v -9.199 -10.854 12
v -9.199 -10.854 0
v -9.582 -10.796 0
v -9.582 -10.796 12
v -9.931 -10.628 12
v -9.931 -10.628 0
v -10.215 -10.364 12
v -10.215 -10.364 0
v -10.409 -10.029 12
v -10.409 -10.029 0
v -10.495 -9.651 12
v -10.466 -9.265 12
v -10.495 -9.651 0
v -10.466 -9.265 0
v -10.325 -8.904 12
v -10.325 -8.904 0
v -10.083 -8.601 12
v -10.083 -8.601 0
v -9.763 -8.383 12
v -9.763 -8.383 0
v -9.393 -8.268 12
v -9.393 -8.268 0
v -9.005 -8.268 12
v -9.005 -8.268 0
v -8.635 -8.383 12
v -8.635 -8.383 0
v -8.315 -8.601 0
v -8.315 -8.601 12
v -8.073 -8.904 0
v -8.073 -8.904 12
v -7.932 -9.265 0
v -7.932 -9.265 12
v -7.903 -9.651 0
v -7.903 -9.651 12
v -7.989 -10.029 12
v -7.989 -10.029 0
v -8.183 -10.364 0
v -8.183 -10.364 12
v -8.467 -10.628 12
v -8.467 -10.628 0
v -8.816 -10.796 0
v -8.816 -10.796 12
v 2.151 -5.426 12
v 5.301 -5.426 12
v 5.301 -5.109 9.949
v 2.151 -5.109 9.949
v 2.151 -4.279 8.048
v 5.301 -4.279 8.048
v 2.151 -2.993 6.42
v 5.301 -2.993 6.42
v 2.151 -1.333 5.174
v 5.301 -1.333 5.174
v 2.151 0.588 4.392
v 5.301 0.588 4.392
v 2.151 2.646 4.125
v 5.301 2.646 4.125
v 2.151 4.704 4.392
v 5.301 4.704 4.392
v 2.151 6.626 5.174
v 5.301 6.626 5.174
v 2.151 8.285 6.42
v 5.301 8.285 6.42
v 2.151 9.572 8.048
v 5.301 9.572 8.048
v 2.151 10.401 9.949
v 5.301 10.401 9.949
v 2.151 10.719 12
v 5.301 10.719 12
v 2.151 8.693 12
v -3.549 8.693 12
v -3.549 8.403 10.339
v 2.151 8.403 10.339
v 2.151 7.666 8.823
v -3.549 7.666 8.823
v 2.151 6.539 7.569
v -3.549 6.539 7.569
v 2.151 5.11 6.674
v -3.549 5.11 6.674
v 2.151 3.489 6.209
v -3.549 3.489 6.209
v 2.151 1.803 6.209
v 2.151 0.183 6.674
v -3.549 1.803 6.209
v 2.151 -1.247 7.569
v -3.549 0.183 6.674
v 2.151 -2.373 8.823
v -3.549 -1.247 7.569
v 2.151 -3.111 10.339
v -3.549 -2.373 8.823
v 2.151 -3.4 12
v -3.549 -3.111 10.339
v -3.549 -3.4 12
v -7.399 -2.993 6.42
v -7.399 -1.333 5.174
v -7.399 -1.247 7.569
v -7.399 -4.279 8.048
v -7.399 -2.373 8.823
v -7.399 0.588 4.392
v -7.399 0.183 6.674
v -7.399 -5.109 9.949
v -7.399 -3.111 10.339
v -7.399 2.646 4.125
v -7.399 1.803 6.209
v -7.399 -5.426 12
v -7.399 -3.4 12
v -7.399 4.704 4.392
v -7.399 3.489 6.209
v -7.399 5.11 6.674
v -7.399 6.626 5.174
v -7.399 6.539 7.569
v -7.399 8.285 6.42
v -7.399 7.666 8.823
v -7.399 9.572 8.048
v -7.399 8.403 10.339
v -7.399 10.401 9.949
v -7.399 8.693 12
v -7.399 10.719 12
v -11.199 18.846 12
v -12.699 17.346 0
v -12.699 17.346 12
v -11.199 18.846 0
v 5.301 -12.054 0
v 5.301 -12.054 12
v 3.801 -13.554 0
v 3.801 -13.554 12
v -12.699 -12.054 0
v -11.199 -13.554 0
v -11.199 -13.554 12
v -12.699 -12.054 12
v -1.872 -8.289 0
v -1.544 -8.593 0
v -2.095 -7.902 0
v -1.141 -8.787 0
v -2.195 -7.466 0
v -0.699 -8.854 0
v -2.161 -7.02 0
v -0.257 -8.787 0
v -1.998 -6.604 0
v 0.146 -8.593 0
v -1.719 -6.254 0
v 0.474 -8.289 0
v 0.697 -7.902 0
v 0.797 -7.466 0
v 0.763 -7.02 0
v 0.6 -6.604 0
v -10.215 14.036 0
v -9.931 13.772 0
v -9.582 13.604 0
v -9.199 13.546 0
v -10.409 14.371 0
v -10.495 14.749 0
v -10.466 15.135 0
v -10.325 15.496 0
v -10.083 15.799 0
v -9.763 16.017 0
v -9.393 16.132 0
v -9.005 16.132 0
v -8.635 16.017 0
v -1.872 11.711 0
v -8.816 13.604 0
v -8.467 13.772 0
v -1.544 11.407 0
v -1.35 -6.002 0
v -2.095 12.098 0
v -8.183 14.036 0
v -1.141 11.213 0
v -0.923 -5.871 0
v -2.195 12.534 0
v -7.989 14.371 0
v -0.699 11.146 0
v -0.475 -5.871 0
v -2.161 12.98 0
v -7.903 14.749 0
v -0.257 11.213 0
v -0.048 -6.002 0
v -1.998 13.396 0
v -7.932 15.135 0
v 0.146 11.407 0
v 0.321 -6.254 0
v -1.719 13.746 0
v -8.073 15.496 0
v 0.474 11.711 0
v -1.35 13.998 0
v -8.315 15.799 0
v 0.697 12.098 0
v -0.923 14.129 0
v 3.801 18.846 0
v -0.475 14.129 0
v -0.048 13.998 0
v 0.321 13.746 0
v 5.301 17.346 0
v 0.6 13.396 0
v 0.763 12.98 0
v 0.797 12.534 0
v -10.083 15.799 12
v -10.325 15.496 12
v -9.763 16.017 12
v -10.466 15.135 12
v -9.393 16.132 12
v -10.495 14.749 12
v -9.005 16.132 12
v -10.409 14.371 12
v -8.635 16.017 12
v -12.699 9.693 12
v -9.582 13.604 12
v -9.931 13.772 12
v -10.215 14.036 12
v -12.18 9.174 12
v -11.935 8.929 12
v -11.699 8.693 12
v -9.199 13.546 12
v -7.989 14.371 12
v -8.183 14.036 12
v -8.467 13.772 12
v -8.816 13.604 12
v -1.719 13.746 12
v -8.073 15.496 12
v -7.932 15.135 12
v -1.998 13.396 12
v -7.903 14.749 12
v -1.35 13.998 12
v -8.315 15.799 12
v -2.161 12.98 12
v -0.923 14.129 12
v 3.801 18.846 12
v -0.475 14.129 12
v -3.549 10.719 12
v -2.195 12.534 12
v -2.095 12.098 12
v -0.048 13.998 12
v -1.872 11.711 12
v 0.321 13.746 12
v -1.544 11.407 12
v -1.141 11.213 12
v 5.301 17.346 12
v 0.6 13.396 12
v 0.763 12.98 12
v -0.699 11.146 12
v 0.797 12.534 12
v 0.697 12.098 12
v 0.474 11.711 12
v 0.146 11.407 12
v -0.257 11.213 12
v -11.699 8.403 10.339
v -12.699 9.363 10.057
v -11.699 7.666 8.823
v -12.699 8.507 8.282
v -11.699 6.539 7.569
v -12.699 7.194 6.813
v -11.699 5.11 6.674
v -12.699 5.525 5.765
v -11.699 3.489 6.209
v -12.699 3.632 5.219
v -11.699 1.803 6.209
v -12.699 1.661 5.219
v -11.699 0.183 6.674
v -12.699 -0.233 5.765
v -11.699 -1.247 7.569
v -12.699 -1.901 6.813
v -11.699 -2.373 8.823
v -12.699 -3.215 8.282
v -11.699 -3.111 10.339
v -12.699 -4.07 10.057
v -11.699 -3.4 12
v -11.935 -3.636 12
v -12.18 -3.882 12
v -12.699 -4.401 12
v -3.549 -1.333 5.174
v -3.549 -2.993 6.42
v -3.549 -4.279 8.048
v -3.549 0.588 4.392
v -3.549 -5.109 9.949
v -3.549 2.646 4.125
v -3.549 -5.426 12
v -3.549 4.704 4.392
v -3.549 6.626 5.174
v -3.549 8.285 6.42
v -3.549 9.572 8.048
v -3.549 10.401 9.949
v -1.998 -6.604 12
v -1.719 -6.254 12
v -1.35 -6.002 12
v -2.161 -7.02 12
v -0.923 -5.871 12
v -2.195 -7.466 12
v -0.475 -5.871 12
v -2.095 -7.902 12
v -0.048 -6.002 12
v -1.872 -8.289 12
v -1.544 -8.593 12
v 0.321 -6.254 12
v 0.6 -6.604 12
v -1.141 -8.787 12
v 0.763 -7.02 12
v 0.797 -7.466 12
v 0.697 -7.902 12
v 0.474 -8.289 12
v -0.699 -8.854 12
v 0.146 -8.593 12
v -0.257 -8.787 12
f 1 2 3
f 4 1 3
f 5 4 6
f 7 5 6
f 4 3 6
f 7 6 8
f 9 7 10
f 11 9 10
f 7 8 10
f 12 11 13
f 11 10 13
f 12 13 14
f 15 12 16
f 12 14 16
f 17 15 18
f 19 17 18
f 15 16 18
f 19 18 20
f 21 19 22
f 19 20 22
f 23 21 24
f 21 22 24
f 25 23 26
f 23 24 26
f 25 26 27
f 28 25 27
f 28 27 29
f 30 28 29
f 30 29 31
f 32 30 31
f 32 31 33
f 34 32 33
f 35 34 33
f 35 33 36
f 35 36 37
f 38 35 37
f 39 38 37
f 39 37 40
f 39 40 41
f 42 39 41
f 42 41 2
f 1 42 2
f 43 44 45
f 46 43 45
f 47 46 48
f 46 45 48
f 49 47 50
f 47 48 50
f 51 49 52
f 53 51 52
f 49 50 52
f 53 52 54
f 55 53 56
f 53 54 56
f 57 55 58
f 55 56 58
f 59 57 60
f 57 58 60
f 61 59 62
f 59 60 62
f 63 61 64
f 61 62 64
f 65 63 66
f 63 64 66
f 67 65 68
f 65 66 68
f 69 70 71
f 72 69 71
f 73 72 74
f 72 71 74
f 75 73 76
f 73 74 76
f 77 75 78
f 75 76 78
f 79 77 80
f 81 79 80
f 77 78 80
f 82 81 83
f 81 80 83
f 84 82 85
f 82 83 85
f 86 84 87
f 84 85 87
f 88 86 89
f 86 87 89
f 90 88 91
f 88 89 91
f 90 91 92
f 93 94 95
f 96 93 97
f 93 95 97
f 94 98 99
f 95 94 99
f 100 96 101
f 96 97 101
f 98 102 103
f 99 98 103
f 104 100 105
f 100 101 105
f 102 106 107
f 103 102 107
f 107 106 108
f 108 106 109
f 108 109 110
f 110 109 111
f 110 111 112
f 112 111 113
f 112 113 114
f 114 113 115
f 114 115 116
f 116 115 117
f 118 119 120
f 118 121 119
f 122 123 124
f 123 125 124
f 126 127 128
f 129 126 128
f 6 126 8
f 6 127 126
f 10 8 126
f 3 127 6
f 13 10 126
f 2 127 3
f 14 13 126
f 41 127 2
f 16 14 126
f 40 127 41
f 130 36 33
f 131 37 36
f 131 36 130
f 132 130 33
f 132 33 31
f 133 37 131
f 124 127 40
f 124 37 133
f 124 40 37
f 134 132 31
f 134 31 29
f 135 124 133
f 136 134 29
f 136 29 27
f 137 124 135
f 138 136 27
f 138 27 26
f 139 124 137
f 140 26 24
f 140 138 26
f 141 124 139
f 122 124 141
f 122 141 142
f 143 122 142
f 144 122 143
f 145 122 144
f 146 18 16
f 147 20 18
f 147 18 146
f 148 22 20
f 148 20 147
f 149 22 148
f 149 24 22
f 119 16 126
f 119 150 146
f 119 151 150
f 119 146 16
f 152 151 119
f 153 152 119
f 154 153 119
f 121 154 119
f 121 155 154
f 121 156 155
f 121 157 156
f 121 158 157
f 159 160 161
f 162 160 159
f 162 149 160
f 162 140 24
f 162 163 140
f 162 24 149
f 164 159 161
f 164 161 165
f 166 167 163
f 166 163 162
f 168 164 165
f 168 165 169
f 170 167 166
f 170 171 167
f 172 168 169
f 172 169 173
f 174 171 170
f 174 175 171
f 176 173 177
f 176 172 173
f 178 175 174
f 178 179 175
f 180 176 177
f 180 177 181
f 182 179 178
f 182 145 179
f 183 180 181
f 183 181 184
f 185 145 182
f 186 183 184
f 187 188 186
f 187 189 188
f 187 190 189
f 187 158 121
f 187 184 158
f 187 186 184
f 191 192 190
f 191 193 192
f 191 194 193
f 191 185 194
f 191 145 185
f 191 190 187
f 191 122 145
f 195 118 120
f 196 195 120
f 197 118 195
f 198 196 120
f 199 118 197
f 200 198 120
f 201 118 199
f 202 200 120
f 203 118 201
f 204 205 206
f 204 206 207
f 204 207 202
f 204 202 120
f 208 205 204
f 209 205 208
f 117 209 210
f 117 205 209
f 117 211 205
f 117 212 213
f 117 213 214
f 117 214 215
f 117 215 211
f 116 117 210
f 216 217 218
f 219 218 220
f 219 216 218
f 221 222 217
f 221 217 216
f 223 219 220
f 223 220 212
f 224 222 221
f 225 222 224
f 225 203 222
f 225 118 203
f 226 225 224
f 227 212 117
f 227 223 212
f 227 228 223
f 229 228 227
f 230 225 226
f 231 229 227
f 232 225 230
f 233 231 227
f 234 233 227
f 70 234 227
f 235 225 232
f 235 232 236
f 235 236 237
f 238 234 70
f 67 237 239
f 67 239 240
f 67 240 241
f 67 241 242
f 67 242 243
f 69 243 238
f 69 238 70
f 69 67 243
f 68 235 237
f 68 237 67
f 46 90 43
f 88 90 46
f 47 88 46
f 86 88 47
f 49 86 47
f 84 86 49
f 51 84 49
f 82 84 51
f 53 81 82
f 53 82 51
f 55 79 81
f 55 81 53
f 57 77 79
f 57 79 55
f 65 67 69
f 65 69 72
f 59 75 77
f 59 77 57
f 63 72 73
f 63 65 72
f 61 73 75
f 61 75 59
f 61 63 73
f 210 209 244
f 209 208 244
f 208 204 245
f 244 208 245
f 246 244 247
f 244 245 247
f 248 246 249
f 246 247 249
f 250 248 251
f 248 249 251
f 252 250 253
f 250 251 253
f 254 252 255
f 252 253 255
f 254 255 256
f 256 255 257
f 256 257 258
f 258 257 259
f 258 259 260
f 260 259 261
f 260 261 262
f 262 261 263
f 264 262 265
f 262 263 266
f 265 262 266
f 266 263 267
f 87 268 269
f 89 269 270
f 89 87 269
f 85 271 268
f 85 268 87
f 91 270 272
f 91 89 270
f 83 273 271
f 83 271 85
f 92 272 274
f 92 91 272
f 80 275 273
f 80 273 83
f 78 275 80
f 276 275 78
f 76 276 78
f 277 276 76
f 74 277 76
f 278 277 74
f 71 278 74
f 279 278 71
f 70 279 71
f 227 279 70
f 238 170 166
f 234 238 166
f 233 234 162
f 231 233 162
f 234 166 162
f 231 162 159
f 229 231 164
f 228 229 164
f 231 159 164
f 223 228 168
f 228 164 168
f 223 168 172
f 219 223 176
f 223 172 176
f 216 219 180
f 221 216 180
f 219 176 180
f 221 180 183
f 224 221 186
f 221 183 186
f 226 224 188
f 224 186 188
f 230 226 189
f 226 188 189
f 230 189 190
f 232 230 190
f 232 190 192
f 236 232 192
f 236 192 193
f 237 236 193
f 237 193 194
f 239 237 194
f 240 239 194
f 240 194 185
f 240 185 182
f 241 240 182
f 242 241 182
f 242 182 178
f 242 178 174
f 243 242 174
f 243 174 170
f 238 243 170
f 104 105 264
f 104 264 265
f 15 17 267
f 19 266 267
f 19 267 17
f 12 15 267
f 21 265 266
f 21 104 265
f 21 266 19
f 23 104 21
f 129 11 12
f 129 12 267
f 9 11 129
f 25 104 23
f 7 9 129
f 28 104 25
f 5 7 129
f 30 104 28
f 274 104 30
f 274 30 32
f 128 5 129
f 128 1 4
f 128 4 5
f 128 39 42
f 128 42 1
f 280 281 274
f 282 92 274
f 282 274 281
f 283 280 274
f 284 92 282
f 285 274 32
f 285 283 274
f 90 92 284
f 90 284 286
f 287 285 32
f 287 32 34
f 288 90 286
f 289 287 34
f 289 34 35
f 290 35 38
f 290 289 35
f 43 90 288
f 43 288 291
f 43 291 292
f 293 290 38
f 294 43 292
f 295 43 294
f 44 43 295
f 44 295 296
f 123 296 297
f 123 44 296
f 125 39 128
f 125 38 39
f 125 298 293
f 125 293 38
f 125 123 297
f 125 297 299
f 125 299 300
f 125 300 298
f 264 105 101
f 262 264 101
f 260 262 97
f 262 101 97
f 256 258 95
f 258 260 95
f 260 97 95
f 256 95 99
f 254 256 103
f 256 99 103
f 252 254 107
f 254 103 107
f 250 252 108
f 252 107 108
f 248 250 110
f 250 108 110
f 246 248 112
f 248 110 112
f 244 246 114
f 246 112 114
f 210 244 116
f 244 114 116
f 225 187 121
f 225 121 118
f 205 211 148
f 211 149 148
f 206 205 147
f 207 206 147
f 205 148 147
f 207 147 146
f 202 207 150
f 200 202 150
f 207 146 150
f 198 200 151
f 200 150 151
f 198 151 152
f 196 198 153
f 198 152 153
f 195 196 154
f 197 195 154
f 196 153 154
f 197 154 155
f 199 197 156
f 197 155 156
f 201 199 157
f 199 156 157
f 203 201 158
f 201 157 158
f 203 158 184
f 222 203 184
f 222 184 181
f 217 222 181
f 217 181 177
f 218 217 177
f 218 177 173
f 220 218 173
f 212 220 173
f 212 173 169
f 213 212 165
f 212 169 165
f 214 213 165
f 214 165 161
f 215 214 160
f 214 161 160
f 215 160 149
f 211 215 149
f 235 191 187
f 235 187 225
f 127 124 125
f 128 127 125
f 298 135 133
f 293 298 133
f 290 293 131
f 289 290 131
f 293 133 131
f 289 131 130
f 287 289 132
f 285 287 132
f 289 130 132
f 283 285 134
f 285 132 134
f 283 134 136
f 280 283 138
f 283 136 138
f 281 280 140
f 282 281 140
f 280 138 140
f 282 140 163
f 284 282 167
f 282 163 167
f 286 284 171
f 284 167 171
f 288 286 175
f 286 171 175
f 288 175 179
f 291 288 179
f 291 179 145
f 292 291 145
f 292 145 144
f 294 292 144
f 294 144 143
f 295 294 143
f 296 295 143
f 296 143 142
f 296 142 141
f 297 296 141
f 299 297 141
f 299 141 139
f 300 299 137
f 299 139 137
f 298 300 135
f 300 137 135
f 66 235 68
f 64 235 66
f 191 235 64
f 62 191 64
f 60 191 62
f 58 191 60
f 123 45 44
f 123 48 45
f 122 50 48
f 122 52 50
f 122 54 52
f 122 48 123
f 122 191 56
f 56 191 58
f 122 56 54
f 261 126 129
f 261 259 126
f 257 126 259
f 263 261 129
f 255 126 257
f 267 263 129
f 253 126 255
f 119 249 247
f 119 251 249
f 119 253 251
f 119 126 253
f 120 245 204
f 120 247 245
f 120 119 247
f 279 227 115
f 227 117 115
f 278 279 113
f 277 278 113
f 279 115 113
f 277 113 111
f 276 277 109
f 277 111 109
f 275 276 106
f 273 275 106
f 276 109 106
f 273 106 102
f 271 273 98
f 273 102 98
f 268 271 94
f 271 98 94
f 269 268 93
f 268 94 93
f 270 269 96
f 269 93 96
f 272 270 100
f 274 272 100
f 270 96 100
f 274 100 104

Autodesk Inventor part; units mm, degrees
ref_plane "YZ Plane" through (0, 0, 0) normal (1, 0, 0) x (0, 1, 0)
ref_plane "XZ Plane" through (0, 0, 0) normal (0, 1, 0) x (-1, 0, 0)
ref_plane "XY Plane" through (0, 0, 0) normal (0, 0, 1) x (1, 0, 0)
sketch "Szkic1" plane through (0, 0, 0) normal (0, 0, 1) x (1, 0, 0)
  line L0 (-10.699, 18.8462) -> (5.301, 18.8462)
  line L1 (5.301, 18.8462) -> (5.301, -13.5538)
  line L2 (5.301, -13.5538) -> (-10.699, -13.5538)
  line L3 (-10.699, -13.5538) -> (-10.699, 18.8462)
  point P0 (0, 0)
  dimension "d0" = 16
  dimension "d1" = 32.4
extrude "Wyciągnięcie proste1" add sketch "Szkic1" along normal blind 12
sketch "Szkic2" plane through (-10.699, -13.5538, 0) normal (-1, 0, 0) x (0, 0, 1)
  line L0 (0, 0) -> (0, 32.4) projected
  line L1 (0, 0) -> (12, 0) projected
  line L2 (12, 32.4) -> (12, 0) projected
  line L3 (0, 32.4) -> (12, 32.4) projected
  line L4 (12, 32.4) -> (12, 0) projected
  circle A0 centre (12.2, 16.2) radius 6.05
  point P0 (0, 13.5538)
  dimension "d4" = 32.4
  dimension "d6" = 12.1
  dimension "d66" = 16.2
  dimension "d67" = 0.2
extrude "Wyciągnięcie proste2" cut sketch "Szkic2" against normal blind 13 contours A0 L2 | L2 A0
sketch "Szkic3" plane through (-10.699, -13.5538, 0) normal (-1, 0, 0) x (0, 0, 1)
  arc A0 (12, 22.2467) -> (12, 10.1533) centre (12.2, 16.2) ccw projected
  line L0 (12, 32.4) -> (12, 22.2467) projected
  line L1 (0, 32.4) -> (12, 32.4) projected
  line L2 (0, 0) -> (0, 32.4) projected
  line L3 (0, 0) -> (12, 0) projected
  line L4 (12, 10.1533) -> (12, 0) projected
  arc A1 (12, 24.2725) -> (12, 8.1275) centre (12.2, 16.2) ccw
  point P0 (0, 13.5538)
  dimension "d9" = 16.15
extrude "Wyciągnięcie proste3" cut sketch "Szkic3" against normal blind 7.15 contours A0 L4 A1 L0
extrude "Wyciągnięcie proste4" add sketch "Szkic3" against normal blind 3.3 contours A0 L4 A1 L0
sketch "Szkic6" plane through (5.301, -13.5538, 0) normal (1, 0, 0) x (0, 0, -1)
  arc A0 (-12, 8.1275) -> (-12, 24.2725) centre (-12.2, 16.2) ccw projected
  line L0 (0, 32.4) -> (0, 0) projected
  line L1 (0, 32.4) -> (-12, 32.4) projected
  line L2 (-12, 0) -> (-12, 32.4) projected
  line L3 (0, 0) -> (-12, 0) projected
  arc A1 (-12, 8.1275) -> (-12, 24.2725) centre (-12.2, 16.2) ccw
  point P0 (0, 13.5538)
extrude "Wyciągnięcie proste5" cut sketch "Szkic6" against normal blind 3.15 contours L2 A0
sketch "Szkic7" plane through (0, 0, 12) normal (0, 0, 1) x (1, 0, 0)
  line L0 (5.301, -5.4264) -> (2.151, -5.4264) projected
  line L1 (2.151, -5.4264) -> (2.151, -3.4005) projected
  line L2 (2.151, -3.4005) -> (-3.549, -3.4005) projected
  line L3 (-3.549, -3.4005) -> (-3.549, -5.4264) projected
  line L4 (-3.549, -5.4264) -> (-7.399, -5.4264) projected
  line L5 (-7.399, -3.4005) -> (-7.399, -5.4264) projected
  line L6 (-10.699, -3.4005) -> (-7.399, -3.4005) projected
  line L7 (-10.699, -3.4005) -> (-10.699, -13.5538) projected
  line L8 (-10.699, -13.5538) -> (5.301, -13.5538) projected
  line L9 (5.301, -13.5538) -> (5.301, -5.4264) projected
  line L10 (2.151, 10.7187) -> (5.301, 10.7187) projected
  line L11 (5.301, 10.7187) -> (5.301, 18.8462) projected
  line L12 (5.301, 18.8462) -> (-10.699, 18.8462) projected
  line L13 (-10.699, 18.8462) -> (-10.699, 8.6929) projected
  line L14 (-10.699, 8.6929) -> (-7.399, 8.6929) projected
  line L15 (-7.399, 10.7187) -> (-7.399, 8.6929) projected
  line L16 (-7.399, 10.7187) -> (-3.549, 10.7187) projected
  line L17 (-3.549, 10.7187) -> (-3.549, 8.6929) projected
  line L18 (-3.549, 8.6929) -> (2.151, 8.6929) projected
  line L19 (2.151, 8.6929) -> (2.151, 10.7187) projected
  point P0 (0, 0)
  point P1 (-0.699, -7.3538)
  point P2 (-0.699, 12.6462)
  dimension "d46" = 20
  dimension "d47" = 32.4
  dimension "d48" = 6.2
  dimension "d49" = 6.2
  dimension "d50" = 5.7
  dimension "d68" = 10
  dimension "d69" = 10
hole "Otwór3" at (-0.699, -7.3538, 12) at (-0.699, 12.6462, 12) direction (0, 0, -1) diameter 3 end through all
sketch "Szkic8" plane through (-10.699, -13.5538, 0) normal (-1, 0, 0) x (0, 0, 1)
  line L0 (12, 32.4) -> (12, 22.2467) projected
  line L1 (0, 32.4) -> (12, 32.4) projected
  line L2 (0, 0) -> (0, 32.4) projected
  line L3 (0, 0) -> (12, 0) projected
  line L4 (12, 10.1533) -> (12, 0) projected
  arc A0 (12, 22.2467) -> (12, 10.1533) centre (12.2, 16.2) ccw projected
  point P0 (0, 13.5538)
extrude "Wyciągnięcie proste6" add sketch "Szkic8" along normal blind 2
chamfer "Faza4" distance 1 angle 45 1 edges at (-12.699, 2.6462, 6.15)
chamfer "Faza5" distance 1.5 angle 45 4 edges at (-12.699, 18.8462, 6) (5.301, 18.8462, 6) (-12.699, -13.5538, 6) (5.301, -13.5538, 6)
sketch "Szkic9" plane through (0, 0, 12) normal (0, 0, 1) x (1, 0, 0)
  line L0 (5.301, -12.0538) -> (3.801, -13.5538) projected
  line L1 (5.301, -12.0538) -> (5.301, -5.4264) projected
  line L2 (5.301, -5.4264) -> (2.151, -5.4264) projected
  line L3 (2.151, -5.4264) -> (2.151, -3.4005) projected
  line L4 (2.151, -3.4005) -> (-3.549, -3.4005) projected
  line L5 (-3.549, -3.4005) -> (-3.549, -5.4264) projected
  line L6 (-3.549, -5.4264) -> (-7.399, -5.4264) projected
  line L7 (-7.399, -3.4005) -> (-7.399, -5.4264) projected
  line L8 (-11.699, -3.4005) -> (-7.399, -3.4005) projected
  line L9 (-12.699, -12.0538) -> (-12.699, -4.401) projected
  line L10 (-11.199, -13.5538) -> (-12.699, -12.0538) projected
  line L11 (3.801, -13.5538) -> (-11.199, -13.5538) projected
  circle A0 centre (-0.699, -7.3538) radius 1.5 projected
  line L12 (3.801, 18.8462) -> (5.301, 17.3462) projected
  line L13 (3.801, 18.8462) -> (-11.199, 18.8462) projected
  line L14 (-12.699, 17.3462) -> (-11.199, 18.8462) projected
  line L15 (-12.699, 9.6933) -> (-12.699, 17.3462) projected
  line L16 (-7.399, 8.6929) -> (-11.699, 8.6929) projected
  line L17 (-7.399, 10.7187) -> (-7.399, 8.6929) projected
  line L18 (-7.399, 10.7187) -> (-3.549, 10.7187) projected
  line L19 (-3.549, 10.7187) -> (-3.549, 8.6929) projected
  line L20 (-3.549, 8.6929) -> (2.151, 8.6929) projected
  line L21 (2.151, 8.6929) -> (2.151, 10.7187) projected
  line L22 (2.151, 10.7187) -> (5.301, 10.7187) projected
  line L23 (5.301, 10.7187) -> (5.301, 17.3462) projected
  circle A1 centre (-0.699, 12.6462) radius 1.5 projected
  point P0 (0, 0)
  point P1 (-9.199, -9.5538)
  point P2 (-9.199, 14.8462)
  dimension "d78" = 3.5
  dimension "d79" = 3.5
  dimension "d80" = 4
  dimension "d81" = 4
hole "Otwór4" at (-9.199, -9.5538, 12) at (-9.199, 14.8462, 12) direction (0, 0, -1) diameter 2.6 end through all
equation "\"d48\" = -0.5 * d46 + 0.5 * d47"
properties part number "3DP_ABS_E3D_V6_Mount_Clamp"
